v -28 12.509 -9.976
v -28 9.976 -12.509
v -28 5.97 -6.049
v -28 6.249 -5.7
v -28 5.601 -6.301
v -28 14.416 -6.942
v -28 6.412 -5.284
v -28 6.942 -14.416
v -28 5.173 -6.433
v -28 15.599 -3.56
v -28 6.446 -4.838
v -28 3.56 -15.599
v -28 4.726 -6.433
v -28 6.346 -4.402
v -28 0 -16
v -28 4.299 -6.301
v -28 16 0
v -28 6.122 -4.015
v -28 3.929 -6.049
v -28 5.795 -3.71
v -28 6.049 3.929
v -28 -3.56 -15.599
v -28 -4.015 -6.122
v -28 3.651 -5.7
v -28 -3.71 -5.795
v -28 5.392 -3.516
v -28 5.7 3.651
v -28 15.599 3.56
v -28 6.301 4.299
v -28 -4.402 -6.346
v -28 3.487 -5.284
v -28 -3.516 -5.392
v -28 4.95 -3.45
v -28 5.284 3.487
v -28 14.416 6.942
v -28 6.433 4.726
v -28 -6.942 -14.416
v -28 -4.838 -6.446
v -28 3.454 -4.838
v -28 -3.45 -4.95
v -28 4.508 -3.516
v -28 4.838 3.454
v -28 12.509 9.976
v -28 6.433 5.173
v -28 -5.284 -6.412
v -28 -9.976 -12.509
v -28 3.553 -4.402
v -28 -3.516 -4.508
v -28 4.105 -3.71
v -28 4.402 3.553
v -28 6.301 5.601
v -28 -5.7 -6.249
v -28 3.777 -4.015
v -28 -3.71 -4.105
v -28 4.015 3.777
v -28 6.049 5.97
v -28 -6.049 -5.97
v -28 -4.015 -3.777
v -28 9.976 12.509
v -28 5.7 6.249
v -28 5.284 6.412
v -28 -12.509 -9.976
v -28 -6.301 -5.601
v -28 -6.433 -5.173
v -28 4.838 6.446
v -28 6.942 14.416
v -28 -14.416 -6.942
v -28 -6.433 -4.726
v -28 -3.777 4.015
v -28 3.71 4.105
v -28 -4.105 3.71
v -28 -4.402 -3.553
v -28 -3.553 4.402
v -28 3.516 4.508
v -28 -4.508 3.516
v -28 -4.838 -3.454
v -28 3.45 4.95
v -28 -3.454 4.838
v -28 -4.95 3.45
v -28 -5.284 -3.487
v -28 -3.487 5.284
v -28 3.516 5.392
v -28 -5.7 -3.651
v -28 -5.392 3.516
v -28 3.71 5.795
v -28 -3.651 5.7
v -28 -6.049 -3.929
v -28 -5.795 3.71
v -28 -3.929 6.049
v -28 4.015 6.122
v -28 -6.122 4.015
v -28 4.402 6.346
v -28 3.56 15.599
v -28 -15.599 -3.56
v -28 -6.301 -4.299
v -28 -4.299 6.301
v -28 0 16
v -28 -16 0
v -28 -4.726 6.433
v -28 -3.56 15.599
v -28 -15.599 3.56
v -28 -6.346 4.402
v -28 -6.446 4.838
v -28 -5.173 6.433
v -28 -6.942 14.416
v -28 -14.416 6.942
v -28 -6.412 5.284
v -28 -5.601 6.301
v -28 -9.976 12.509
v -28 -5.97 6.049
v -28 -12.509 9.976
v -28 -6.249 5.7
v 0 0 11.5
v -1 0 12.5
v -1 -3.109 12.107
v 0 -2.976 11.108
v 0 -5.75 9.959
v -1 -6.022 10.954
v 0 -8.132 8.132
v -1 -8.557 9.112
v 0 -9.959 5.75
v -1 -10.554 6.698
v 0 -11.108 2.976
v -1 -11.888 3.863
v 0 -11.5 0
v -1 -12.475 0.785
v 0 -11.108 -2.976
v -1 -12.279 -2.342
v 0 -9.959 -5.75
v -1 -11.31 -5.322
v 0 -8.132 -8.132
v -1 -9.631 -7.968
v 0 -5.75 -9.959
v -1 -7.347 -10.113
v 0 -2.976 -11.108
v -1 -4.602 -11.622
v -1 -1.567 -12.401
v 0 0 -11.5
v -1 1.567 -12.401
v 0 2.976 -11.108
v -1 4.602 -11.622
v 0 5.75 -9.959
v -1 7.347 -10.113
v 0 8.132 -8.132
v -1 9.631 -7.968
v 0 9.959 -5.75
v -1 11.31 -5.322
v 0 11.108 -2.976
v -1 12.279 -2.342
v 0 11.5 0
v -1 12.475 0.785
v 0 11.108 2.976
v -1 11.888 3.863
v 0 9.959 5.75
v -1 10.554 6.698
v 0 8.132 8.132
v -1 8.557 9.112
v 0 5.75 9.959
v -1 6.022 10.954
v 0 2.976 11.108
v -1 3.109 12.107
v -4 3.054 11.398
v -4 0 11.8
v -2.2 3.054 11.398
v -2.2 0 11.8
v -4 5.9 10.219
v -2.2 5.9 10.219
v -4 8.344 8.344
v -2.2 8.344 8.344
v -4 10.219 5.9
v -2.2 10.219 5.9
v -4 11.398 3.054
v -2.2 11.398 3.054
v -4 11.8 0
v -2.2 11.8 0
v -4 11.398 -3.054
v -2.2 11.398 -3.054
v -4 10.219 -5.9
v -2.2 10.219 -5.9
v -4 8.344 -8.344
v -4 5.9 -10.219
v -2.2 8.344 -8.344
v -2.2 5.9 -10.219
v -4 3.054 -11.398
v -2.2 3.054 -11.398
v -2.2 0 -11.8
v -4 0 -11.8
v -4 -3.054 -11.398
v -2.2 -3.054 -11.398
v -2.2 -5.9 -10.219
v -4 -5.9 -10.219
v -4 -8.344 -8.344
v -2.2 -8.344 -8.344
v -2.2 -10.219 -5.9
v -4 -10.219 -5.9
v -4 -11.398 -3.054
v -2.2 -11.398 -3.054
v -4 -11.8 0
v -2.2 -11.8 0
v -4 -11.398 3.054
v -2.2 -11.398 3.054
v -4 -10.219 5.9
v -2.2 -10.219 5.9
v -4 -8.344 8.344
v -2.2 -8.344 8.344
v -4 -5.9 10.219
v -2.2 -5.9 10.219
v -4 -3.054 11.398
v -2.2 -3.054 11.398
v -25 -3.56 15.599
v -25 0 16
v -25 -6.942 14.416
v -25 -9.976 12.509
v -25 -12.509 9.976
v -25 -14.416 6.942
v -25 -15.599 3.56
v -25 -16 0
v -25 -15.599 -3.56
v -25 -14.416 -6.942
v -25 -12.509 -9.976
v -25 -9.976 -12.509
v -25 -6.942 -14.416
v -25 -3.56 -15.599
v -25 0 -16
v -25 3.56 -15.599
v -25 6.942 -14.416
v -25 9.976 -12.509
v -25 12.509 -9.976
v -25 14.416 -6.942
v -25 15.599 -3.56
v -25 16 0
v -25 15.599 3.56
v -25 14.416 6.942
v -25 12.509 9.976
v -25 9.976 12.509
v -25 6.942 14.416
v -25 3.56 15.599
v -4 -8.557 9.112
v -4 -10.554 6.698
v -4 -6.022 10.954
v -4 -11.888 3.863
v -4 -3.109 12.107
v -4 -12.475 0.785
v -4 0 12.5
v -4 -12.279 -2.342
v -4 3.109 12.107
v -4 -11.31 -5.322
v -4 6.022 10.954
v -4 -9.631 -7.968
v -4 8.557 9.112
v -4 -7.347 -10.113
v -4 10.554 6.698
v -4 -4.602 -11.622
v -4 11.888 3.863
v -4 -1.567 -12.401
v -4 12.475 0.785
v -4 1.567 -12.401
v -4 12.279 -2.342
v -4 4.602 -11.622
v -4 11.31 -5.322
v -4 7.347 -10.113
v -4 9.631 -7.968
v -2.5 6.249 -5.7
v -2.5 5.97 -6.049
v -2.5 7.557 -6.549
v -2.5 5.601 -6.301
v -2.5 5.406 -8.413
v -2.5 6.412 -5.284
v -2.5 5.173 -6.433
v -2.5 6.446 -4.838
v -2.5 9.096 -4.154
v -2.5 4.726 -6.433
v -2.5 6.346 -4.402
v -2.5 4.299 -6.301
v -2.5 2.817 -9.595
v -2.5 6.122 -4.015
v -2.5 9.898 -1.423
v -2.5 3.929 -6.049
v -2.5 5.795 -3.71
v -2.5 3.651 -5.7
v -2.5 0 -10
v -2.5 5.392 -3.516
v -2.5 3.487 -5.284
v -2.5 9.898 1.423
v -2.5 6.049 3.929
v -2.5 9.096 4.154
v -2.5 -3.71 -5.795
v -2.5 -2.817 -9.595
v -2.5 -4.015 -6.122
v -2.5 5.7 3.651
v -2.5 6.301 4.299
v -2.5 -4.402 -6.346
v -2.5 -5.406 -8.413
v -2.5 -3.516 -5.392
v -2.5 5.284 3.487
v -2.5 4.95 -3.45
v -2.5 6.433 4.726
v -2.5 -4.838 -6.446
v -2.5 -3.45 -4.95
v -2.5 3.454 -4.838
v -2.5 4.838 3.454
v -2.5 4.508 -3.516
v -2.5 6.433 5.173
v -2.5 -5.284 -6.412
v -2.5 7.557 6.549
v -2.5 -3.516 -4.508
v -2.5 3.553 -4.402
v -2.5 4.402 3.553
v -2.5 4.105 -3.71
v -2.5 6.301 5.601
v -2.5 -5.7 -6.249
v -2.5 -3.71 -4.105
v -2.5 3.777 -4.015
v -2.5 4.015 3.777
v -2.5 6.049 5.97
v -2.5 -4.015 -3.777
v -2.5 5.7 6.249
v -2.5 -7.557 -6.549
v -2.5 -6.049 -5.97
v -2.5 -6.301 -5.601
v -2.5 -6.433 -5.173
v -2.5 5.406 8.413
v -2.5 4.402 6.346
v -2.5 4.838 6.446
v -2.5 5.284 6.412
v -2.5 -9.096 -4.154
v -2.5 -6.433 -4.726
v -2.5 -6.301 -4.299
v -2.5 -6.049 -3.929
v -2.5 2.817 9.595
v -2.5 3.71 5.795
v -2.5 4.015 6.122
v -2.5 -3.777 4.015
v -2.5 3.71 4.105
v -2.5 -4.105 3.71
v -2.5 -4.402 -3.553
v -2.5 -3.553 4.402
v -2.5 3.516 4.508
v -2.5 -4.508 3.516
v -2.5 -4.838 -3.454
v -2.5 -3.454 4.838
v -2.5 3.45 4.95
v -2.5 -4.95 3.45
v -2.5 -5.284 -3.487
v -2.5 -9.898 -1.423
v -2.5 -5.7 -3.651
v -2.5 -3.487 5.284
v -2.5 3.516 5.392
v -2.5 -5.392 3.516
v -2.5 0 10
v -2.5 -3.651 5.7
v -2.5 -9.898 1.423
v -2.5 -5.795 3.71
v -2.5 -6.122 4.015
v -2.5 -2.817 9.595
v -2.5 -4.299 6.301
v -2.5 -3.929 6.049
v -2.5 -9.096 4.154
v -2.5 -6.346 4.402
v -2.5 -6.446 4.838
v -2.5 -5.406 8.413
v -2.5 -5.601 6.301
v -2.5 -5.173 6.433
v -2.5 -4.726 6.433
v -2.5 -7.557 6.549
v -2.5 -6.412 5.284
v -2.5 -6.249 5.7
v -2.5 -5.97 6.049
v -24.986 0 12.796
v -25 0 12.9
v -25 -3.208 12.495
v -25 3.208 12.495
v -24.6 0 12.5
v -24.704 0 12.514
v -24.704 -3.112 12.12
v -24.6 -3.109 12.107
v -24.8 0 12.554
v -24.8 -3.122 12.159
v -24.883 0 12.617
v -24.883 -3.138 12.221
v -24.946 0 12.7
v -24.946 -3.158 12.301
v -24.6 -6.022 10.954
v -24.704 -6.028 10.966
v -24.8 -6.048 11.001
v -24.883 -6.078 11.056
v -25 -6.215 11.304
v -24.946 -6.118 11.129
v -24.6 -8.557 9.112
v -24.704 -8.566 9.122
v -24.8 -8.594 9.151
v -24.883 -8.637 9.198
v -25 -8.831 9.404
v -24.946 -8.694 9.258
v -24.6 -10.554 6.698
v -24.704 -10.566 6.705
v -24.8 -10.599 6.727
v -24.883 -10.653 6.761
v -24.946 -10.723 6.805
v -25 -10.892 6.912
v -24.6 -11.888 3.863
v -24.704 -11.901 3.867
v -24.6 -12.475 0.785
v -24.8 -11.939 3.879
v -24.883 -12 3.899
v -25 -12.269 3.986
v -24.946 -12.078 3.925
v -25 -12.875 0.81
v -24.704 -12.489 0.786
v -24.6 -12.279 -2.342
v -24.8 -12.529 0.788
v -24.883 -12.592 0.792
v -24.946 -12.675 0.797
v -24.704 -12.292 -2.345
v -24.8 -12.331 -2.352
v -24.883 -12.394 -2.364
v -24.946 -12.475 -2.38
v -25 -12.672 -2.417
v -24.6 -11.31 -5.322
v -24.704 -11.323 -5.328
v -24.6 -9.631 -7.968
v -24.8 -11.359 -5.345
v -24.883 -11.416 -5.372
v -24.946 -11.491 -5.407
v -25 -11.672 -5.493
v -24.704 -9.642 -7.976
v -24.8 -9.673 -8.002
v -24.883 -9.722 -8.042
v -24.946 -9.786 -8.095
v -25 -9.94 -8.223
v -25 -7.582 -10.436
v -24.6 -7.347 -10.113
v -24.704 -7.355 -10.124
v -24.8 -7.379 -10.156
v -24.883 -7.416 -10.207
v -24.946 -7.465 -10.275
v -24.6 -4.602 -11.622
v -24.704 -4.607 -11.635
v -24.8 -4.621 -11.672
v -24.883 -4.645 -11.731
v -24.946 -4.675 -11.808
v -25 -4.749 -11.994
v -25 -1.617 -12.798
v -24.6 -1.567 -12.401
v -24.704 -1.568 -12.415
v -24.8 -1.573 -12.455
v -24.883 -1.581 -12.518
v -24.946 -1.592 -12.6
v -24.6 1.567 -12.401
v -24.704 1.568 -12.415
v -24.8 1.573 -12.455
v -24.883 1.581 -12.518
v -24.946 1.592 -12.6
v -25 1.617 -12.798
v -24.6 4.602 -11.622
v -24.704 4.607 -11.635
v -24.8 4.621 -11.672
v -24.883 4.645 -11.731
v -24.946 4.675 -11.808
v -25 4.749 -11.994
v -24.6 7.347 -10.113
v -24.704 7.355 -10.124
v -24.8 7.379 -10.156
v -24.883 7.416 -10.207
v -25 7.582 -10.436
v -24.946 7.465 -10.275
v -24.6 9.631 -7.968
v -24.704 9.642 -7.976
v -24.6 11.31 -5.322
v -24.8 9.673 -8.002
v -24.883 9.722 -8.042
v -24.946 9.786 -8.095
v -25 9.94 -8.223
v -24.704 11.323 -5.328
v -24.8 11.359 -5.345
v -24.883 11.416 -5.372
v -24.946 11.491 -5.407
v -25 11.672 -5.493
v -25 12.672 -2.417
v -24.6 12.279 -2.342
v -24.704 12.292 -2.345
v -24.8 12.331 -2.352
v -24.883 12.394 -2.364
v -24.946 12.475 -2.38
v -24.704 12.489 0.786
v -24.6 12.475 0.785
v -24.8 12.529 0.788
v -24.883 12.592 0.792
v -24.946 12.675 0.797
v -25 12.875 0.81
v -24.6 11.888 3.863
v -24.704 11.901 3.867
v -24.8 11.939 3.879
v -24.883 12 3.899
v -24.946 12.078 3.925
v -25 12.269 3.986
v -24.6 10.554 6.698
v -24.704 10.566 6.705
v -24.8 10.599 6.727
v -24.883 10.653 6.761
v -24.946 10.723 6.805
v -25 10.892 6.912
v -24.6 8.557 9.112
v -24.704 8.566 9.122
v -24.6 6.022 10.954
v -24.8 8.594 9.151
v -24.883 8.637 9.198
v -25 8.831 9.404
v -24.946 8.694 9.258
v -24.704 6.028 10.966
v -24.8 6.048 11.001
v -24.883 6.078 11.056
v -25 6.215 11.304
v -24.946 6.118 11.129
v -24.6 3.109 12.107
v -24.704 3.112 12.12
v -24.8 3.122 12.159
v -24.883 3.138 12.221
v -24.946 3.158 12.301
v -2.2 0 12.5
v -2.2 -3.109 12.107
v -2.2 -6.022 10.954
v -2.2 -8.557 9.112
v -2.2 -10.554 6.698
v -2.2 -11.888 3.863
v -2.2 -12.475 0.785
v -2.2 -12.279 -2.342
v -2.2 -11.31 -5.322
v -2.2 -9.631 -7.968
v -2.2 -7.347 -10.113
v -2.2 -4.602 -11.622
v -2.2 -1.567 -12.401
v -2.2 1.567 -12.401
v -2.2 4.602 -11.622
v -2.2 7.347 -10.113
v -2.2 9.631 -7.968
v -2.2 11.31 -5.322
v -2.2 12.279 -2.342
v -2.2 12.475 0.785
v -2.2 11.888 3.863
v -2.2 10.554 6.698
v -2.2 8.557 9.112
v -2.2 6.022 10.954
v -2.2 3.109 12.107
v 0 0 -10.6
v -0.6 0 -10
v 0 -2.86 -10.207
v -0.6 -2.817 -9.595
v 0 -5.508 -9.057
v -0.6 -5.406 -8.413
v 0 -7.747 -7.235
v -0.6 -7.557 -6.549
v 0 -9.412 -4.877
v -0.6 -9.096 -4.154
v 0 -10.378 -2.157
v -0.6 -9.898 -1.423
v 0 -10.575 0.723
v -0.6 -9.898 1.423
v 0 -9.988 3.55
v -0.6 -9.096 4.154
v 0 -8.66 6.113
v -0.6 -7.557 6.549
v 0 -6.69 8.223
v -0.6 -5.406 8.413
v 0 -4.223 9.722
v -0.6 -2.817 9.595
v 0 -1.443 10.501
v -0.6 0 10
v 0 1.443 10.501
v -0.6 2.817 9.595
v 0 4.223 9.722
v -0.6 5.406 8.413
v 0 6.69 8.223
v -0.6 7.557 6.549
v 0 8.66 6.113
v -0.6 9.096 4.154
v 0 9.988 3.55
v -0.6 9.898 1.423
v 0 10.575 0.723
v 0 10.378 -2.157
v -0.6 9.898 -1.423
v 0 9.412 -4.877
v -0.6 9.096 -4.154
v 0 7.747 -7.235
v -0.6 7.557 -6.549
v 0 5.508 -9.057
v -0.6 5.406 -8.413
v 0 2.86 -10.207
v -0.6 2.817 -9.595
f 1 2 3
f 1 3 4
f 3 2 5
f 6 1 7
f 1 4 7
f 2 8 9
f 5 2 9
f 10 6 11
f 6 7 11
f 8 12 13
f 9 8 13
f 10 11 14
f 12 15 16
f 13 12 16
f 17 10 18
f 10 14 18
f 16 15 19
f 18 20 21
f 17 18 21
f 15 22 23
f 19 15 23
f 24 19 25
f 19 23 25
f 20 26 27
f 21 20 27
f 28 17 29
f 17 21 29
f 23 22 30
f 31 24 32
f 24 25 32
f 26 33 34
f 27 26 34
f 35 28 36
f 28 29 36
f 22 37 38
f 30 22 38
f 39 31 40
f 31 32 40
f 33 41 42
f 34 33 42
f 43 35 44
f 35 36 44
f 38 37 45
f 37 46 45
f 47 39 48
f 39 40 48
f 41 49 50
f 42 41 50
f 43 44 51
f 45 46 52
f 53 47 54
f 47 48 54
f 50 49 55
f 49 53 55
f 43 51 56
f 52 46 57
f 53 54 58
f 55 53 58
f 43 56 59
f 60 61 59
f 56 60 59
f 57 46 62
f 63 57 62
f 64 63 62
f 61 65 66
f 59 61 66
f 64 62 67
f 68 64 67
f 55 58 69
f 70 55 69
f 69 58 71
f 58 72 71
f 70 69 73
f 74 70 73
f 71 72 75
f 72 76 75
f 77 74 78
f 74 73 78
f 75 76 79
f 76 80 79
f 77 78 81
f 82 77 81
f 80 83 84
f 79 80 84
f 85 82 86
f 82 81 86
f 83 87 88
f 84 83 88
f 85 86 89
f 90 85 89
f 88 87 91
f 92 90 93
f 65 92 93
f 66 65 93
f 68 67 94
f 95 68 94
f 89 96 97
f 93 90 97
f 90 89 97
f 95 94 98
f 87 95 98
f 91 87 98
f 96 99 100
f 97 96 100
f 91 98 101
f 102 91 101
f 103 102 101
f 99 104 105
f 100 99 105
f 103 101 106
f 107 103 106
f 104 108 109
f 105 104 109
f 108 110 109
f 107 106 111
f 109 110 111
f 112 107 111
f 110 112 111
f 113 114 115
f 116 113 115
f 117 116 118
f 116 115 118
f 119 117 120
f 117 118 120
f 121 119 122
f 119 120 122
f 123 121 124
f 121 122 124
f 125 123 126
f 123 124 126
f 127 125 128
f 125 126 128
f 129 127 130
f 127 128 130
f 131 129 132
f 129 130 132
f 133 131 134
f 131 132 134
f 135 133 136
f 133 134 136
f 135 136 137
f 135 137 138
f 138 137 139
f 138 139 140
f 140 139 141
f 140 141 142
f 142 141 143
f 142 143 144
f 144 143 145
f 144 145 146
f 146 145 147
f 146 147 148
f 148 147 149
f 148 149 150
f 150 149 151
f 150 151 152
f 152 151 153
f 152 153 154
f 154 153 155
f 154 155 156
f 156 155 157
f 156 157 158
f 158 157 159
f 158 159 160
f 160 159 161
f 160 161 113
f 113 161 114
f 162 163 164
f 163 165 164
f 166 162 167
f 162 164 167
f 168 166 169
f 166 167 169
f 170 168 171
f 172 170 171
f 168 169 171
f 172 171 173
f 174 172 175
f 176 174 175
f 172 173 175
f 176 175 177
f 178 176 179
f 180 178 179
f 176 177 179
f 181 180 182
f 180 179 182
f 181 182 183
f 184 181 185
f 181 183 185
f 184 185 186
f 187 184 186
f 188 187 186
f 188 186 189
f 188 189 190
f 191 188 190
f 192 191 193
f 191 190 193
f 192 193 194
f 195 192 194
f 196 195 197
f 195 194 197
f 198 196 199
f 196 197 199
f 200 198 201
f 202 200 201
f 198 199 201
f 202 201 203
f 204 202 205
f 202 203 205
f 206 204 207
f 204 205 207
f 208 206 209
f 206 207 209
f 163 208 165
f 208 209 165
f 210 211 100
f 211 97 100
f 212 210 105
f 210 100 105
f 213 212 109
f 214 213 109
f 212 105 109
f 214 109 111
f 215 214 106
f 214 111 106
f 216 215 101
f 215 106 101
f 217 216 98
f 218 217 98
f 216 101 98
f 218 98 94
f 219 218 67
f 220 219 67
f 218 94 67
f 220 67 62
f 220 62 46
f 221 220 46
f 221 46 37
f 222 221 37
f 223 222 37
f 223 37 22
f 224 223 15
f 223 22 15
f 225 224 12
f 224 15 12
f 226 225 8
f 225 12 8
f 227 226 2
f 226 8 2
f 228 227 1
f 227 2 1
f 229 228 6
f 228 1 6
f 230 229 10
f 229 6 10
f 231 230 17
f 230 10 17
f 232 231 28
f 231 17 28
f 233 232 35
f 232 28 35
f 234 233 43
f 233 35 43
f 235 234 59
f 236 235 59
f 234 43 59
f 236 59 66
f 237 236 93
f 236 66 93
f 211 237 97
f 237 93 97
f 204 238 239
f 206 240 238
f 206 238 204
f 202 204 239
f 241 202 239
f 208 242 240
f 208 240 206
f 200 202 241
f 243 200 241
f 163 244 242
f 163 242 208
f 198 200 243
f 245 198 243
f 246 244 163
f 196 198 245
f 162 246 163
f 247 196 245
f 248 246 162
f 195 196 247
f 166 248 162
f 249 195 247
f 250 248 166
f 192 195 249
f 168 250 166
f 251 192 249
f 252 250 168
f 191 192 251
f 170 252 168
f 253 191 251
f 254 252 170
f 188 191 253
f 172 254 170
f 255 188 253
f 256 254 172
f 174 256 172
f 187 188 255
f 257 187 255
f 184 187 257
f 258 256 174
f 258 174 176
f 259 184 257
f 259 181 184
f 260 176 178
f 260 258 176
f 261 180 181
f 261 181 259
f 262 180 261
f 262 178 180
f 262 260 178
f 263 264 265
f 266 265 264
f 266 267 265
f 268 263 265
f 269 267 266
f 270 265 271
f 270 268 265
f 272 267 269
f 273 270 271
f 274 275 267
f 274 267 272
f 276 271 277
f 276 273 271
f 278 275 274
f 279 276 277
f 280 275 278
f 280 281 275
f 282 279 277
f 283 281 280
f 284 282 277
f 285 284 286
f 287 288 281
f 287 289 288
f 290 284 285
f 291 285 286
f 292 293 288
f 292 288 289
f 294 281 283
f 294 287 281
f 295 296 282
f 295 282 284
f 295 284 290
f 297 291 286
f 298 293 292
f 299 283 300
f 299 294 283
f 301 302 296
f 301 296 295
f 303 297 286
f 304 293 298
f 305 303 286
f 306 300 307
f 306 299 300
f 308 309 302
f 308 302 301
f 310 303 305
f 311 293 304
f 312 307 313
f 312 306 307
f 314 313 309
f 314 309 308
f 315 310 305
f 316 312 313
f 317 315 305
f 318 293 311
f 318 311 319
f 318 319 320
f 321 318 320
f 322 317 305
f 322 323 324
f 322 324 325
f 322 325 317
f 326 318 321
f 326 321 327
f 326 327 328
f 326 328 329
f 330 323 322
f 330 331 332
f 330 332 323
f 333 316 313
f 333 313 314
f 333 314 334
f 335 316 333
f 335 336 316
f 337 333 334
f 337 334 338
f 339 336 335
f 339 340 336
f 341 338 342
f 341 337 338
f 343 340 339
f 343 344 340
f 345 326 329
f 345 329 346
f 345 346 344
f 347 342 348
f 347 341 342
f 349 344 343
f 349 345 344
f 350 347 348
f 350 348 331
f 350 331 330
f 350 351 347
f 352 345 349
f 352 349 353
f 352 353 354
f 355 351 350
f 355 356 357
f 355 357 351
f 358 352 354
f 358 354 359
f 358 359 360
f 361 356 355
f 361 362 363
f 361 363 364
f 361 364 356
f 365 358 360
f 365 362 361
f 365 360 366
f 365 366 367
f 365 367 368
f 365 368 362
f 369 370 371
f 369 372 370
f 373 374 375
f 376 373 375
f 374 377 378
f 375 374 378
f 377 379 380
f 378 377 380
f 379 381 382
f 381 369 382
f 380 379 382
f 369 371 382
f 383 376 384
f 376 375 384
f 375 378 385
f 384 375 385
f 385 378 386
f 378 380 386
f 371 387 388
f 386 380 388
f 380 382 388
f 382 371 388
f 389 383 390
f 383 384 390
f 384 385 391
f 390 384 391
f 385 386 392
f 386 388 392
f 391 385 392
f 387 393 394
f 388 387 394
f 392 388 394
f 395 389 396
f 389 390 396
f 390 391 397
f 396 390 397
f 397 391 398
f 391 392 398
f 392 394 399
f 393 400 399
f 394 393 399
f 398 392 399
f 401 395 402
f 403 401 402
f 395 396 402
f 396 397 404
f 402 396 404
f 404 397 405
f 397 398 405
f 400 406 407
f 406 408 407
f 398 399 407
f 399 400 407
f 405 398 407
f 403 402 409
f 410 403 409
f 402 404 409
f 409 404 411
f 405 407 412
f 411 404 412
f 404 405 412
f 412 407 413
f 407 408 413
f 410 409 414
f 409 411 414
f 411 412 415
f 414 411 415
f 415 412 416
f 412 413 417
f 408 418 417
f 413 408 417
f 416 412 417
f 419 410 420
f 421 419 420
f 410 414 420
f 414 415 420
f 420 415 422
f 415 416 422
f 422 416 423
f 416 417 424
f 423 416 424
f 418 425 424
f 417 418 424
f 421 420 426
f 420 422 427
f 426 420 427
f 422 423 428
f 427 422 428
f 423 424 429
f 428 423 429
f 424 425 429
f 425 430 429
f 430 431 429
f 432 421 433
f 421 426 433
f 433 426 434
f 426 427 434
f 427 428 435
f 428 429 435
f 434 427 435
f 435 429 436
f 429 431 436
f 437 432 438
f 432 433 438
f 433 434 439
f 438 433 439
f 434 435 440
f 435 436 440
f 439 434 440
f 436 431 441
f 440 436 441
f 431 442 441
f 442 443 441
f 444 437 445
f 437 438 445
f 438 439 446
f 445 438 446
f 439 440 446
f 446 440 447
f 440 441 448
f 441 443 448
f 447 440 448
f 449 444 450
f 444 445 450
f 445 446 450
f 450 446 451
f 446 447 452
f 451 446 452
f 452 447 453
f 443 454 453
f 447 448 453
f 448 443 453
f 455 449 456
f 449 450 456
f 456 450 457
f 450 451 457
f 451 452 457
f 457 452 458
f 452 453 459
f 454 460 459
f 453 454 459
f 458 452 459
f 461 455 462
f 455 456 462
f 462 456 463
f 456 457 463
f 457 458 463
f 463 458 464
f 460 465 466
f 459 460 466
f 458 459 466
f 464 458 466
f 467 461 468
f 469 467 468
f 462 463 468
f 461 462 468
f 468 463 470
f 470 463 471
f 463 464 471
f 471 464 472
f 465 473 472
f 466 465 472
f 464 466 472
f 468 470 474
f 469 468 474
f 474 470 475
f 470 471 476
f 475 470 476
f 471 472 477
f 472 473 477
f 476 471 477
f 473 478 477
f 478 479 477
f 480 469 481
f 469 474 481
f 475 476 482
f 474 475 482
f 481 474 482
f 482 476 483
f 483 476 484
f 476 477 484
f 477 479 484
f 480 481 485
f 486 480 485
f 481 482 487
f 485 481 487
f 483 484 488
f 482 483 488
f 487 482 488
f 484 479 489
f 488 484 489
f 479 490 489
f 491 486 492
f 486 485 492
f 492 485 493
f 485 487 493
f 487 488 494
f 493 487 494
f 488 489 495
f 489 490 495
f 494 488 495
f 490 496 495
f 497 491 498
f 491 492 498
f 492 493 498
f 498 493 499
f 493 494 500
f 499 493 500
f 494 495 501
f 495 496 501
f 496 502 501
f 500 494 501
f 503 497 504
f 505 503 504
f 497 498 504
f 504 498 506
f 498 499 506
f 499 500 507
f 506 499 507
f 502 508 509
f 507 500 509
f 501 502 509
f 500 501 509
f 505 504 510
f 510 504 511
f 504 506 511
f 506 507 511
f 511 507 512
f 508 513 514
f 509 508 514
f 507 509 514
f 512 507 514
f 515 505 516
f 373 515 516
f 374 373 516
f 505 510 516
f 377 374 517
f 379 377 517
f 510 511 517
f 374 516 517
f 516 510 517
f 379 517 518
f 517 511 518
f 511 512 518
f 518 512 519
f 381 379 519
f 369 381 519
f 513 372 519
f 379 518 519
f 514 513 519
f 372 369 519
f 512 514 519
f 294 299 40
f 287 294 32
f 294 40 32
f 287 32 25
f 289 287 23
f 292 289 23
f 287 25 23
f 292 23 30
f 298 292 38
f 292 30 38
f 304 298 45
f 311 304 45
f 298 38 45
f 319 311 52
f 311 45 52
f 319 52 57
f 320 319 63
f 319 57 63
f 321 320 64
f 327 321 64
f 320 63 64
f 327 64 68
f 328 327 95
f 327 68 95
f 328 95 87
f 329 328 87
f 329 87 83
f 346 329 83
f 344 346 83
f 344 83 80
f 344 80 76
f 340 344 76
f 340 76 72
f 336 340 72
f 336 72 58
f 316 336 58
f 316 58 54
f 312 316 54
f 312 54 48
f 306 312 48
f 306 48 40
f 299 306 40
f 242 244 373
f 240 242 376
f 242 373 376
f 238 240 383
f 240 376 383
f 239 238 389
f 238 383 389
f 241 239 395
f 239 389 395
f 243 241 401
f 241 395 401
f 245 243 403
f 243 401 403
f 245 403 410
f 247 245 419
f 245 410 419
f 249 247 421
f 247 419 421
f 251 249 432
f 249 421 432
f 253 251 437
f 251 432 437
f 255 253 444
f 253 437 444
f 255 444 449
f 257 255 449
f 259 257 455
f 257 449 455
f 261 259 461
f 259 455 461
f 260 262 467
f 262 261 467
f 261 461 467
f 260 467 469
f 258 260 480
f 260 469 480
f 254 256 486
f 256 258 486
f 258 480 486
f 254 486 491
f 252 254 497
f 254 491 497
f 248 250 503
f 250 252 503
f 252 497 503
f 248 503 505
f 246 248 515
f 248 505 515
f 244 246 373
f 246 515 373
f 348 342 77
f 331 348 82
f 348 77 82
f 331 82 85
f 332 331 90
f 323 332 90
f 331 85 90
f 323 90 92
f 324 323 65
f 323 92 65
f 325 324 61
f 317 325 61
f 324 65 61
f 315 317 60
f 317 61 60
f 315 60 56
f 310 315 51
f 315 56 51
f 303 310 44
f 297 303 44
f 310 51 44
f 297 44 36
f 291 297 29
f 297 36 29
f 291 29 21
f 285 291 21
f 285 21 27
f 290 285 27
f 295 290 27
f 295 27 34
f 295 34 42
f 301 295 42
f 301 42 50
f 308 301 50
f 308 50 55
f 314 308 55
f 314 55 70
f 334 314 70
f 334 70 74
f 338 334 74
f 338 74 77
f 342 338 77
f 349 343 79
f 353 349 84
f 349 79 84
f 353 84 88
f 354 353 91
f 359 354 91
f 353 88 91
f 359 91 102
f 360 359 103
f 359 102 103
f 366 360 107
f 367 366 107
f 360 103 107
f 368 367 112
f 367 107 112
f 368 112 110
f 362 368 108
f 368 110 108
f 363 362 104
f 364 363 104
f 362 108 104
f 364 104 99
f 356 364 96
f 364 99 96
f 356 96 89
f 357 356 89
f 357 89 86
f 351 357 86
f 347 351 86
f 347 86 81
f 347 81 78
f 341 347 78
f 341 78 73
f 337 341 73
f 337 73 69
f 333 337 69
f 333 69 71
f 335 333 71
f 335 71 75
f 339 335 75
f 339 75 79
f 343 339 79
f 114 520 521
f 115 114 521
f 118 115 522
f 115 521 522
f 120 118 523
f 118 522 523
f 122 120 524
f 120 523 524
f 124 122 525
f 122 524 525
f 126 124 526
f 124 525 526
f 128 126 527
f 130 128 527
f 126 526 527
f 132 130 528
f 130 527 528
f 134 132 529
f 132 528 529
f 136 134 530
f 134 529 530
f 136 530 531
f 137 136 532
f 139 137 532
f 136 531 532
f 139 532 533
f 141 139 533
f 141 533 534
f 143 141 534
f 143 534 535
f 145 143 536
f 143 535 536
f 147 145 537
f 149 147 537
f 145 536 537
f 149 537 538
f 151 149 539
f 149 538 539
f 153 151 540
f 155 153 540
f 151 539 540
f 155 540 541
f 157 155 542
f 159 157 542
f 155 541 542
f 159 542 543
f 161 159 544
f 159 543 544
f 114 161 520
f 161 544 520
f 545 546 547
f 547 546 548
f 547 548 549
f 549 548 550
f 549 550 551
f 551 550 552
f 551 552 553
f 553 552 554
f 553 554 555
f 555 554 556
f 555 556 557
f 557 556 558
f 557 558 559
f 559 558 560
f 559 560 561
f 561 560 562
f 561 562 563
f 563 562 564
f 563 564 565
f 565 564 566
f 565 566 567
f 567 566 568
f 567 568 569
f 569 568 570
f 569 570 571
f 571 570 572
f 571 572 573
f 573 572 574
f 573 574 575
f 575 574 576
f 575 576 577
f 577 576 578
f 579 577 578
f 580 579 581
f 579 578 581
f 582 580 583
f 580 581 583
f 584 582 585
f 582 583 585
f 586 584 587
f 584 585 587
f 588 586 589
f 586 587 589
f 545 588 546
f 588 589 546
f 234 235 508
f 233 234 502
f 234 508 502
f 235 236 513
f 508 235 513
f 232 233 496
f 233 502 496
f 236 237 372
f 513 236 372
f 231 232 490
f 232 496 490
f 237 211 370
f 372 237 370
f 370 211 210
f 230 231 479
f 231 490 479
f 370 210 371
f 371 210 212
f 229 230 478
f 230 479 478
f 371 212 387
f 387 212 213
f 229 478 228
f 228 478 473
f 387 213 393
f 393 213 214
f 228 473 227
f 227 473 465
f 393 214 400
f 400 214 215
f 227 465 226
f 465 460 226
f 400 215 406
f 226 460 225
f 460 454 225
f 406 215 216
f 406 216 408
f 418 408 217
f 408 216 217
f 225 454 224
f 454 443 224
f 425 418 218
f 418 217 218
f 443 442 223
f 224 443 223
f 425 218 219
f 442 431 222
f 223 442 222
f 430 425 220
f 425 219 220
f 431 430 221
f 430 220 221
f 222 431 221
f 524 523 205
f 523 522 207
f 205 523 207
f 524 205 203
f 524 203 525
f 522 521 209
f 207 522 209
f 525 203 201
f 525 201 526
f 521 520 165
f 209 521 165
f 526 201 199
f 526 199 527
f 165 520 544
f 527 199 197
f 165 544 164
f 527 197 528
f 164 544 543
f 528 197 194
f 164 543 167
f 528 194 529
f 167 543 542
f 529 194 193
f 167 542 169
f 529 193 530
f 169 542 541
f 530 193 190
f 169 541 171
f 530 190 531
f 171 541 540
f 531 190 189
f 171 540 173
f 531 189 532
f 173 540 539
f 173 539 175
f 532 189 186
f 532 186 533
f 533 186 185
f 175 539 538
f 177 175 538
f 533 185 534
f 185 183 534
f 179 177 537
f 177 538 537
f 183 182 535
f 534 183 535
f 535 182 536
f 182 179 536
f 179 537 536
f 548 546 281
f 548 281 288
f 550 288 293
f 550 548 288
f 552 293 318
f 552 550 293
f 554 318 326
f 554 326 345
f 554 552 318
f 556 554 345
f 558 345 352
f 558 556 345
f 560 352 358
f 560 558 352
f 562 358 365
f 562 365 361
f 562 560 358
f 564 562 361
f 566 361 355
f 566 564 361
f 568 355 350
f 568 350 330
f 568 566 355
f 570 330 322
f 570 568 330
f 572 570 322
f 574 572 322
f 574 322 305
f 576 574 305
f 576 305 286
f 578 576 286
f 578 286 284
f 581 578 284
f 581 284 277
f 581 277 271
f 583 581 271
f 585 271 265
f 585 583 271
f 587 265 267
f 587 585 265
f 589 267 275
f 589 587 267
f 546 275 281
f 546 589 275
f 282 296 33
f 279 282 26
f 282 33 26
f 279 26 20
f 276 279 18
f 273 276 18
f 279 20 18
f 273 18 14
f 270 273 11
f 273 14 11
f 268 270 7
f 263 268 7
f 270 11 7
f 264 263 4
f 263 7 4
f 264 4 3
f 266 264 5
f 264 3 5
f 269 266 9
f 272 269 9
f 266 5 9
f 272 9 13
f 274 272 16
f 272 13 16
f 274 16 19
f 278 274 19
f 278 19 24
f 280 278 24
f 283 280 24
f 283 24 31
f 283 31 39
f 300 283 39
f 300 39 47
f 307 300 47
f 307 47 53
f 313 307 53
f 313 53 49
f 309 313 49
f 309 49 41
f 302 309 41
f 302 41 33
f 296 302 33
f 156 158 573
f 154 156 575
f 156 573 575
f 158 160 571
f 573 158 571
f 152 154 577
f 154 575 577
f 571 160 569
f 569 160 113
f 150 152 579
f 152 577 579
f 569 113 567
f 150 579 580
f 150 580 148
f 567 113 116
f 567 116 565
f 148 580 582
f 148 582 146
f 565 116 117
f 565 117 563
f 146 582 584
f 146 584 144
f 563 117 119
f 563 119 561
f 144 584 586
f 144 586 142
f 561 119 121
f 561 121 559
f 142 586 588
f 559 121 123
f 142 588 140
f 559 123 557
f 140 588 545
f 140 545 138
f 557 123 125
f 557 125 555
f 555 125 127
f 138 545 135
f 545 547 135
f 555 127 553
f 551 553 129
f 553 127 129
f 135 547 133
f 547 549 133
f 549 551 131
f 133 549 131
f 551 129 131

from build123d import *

# Parameters (mm, degrees)
SKETCH_2_W               = 1.8
SKETCH_2_H               = 0.7
CHAMFER_1_SIZE           = 1
FILLET_1_R               = 0.4
HOLE_WIZARD_1_D          = 3
PATTERN_CIRCULAR_1_COUNT = 4
SKETCH_5_W               = 2.5
SKETCH_5_H               = 10
CHAMFER_2_SIZE           = 0.6


with BuildPart() as part:
    # Эскиз1 → Повернуть1 (revolve)
    with BuildSketch(Plane.XY, mode=Mode.PRIVATE) as revolve_1_sk:
        Polygon((0, 0), (0, 12.5), (-25, 12.5), (-25, 16), (-28, 16), (-28, 0), align=None)
    revolve(revolve_1_sk.sketch.rotate(Axis((0, 0, 0), (1, 0, 0)), 90), axis=Axis((0, 0, 0), (1, 0, 0)))

    # Эскиз2 → Вырез-Повернуть1 (revolve, cut)
    with BuildSketch(Plane.XY, mode=Mode.PRIVATE) as cut_revolve_1_sk:
        with Locations((-3.1, 12.15)):
            Rectangle(SKETCH_2_W, SKETCH_2_H)
    revolve(cut_revolve_1_sk.sketch.rotate(Axis((0, 0, 0), (-1, 0, 0)), 270), axis=Axis((0, 0, 0), (-1, 0, 0)), mode=Mode.SUBTRACT)

    # Фаска1
    chamfer_1_edges = [part.edges().sort_by_distance(p)[0] for p in [
        (0, 0, -12.5),
    ]]
    chamfer(chamfer_1_edges, length=CHAMFER_1_SIZE)

    # Скругление1
    fillet_1_edges = [part.edges().sort_by_distance(p)[0] for p in [
        (-25, 0, -12.5),
    ]]
    fillet(fillet_1_edges, radius=FILLET_1_R)

    # Отверстие1 (through all)
    with Locations(Plane(origin=(0, 0, 0), x_dir=(0, 0, -1), z_dir=(1, 0, 0))):
        with Locations((4.949747468, 4.949747468)):
            hole_wizard_1 = Hole(HOLE_WIZARD_1_D / 2)

    # Круговой массив1: Отверстие1 ×4 about axis
    pattern_circular_1_axis = Axis((0, 0, 0), (1, 0, 0))
    for i in range(1, PATTERN_CIRCULAR_1_COUNT):
        add(hole_wizard_1.rotate(pattern_circular_1_axis, i * 360 / PATTERN_CIRCULAR_1_COUNT), mode=Mode.SUBTRACT)

    # Эскиз5 → Вырез-Повернуть2 (revolve, cut)
    with BuildSketch(Plane.XY, mode=Mode.PRIVATE) as cut_revolve_2_sk:
        with Locations((-1.25, 5)):
            Rectangle(SKETCH_5_W, SKETCH_5_H)
    revolve(cut_revolve_2_sk.sketch.rotate(Axis((0, 0, 0), (-1, 0, 0)), 90), axis=Axis((0, 0, 0), (-1, 0, 0)), mode=Mode.SUBTRACT)

    # Фаска2
    chamfer_2_edges = [part.edges().sort_by_distance(p)[0] for p in [
        (0, 0, 10),
    ]]
    chamfer(chamfer_2_edges, length=CHAMFER_2_SIZE)


solid = part.part
